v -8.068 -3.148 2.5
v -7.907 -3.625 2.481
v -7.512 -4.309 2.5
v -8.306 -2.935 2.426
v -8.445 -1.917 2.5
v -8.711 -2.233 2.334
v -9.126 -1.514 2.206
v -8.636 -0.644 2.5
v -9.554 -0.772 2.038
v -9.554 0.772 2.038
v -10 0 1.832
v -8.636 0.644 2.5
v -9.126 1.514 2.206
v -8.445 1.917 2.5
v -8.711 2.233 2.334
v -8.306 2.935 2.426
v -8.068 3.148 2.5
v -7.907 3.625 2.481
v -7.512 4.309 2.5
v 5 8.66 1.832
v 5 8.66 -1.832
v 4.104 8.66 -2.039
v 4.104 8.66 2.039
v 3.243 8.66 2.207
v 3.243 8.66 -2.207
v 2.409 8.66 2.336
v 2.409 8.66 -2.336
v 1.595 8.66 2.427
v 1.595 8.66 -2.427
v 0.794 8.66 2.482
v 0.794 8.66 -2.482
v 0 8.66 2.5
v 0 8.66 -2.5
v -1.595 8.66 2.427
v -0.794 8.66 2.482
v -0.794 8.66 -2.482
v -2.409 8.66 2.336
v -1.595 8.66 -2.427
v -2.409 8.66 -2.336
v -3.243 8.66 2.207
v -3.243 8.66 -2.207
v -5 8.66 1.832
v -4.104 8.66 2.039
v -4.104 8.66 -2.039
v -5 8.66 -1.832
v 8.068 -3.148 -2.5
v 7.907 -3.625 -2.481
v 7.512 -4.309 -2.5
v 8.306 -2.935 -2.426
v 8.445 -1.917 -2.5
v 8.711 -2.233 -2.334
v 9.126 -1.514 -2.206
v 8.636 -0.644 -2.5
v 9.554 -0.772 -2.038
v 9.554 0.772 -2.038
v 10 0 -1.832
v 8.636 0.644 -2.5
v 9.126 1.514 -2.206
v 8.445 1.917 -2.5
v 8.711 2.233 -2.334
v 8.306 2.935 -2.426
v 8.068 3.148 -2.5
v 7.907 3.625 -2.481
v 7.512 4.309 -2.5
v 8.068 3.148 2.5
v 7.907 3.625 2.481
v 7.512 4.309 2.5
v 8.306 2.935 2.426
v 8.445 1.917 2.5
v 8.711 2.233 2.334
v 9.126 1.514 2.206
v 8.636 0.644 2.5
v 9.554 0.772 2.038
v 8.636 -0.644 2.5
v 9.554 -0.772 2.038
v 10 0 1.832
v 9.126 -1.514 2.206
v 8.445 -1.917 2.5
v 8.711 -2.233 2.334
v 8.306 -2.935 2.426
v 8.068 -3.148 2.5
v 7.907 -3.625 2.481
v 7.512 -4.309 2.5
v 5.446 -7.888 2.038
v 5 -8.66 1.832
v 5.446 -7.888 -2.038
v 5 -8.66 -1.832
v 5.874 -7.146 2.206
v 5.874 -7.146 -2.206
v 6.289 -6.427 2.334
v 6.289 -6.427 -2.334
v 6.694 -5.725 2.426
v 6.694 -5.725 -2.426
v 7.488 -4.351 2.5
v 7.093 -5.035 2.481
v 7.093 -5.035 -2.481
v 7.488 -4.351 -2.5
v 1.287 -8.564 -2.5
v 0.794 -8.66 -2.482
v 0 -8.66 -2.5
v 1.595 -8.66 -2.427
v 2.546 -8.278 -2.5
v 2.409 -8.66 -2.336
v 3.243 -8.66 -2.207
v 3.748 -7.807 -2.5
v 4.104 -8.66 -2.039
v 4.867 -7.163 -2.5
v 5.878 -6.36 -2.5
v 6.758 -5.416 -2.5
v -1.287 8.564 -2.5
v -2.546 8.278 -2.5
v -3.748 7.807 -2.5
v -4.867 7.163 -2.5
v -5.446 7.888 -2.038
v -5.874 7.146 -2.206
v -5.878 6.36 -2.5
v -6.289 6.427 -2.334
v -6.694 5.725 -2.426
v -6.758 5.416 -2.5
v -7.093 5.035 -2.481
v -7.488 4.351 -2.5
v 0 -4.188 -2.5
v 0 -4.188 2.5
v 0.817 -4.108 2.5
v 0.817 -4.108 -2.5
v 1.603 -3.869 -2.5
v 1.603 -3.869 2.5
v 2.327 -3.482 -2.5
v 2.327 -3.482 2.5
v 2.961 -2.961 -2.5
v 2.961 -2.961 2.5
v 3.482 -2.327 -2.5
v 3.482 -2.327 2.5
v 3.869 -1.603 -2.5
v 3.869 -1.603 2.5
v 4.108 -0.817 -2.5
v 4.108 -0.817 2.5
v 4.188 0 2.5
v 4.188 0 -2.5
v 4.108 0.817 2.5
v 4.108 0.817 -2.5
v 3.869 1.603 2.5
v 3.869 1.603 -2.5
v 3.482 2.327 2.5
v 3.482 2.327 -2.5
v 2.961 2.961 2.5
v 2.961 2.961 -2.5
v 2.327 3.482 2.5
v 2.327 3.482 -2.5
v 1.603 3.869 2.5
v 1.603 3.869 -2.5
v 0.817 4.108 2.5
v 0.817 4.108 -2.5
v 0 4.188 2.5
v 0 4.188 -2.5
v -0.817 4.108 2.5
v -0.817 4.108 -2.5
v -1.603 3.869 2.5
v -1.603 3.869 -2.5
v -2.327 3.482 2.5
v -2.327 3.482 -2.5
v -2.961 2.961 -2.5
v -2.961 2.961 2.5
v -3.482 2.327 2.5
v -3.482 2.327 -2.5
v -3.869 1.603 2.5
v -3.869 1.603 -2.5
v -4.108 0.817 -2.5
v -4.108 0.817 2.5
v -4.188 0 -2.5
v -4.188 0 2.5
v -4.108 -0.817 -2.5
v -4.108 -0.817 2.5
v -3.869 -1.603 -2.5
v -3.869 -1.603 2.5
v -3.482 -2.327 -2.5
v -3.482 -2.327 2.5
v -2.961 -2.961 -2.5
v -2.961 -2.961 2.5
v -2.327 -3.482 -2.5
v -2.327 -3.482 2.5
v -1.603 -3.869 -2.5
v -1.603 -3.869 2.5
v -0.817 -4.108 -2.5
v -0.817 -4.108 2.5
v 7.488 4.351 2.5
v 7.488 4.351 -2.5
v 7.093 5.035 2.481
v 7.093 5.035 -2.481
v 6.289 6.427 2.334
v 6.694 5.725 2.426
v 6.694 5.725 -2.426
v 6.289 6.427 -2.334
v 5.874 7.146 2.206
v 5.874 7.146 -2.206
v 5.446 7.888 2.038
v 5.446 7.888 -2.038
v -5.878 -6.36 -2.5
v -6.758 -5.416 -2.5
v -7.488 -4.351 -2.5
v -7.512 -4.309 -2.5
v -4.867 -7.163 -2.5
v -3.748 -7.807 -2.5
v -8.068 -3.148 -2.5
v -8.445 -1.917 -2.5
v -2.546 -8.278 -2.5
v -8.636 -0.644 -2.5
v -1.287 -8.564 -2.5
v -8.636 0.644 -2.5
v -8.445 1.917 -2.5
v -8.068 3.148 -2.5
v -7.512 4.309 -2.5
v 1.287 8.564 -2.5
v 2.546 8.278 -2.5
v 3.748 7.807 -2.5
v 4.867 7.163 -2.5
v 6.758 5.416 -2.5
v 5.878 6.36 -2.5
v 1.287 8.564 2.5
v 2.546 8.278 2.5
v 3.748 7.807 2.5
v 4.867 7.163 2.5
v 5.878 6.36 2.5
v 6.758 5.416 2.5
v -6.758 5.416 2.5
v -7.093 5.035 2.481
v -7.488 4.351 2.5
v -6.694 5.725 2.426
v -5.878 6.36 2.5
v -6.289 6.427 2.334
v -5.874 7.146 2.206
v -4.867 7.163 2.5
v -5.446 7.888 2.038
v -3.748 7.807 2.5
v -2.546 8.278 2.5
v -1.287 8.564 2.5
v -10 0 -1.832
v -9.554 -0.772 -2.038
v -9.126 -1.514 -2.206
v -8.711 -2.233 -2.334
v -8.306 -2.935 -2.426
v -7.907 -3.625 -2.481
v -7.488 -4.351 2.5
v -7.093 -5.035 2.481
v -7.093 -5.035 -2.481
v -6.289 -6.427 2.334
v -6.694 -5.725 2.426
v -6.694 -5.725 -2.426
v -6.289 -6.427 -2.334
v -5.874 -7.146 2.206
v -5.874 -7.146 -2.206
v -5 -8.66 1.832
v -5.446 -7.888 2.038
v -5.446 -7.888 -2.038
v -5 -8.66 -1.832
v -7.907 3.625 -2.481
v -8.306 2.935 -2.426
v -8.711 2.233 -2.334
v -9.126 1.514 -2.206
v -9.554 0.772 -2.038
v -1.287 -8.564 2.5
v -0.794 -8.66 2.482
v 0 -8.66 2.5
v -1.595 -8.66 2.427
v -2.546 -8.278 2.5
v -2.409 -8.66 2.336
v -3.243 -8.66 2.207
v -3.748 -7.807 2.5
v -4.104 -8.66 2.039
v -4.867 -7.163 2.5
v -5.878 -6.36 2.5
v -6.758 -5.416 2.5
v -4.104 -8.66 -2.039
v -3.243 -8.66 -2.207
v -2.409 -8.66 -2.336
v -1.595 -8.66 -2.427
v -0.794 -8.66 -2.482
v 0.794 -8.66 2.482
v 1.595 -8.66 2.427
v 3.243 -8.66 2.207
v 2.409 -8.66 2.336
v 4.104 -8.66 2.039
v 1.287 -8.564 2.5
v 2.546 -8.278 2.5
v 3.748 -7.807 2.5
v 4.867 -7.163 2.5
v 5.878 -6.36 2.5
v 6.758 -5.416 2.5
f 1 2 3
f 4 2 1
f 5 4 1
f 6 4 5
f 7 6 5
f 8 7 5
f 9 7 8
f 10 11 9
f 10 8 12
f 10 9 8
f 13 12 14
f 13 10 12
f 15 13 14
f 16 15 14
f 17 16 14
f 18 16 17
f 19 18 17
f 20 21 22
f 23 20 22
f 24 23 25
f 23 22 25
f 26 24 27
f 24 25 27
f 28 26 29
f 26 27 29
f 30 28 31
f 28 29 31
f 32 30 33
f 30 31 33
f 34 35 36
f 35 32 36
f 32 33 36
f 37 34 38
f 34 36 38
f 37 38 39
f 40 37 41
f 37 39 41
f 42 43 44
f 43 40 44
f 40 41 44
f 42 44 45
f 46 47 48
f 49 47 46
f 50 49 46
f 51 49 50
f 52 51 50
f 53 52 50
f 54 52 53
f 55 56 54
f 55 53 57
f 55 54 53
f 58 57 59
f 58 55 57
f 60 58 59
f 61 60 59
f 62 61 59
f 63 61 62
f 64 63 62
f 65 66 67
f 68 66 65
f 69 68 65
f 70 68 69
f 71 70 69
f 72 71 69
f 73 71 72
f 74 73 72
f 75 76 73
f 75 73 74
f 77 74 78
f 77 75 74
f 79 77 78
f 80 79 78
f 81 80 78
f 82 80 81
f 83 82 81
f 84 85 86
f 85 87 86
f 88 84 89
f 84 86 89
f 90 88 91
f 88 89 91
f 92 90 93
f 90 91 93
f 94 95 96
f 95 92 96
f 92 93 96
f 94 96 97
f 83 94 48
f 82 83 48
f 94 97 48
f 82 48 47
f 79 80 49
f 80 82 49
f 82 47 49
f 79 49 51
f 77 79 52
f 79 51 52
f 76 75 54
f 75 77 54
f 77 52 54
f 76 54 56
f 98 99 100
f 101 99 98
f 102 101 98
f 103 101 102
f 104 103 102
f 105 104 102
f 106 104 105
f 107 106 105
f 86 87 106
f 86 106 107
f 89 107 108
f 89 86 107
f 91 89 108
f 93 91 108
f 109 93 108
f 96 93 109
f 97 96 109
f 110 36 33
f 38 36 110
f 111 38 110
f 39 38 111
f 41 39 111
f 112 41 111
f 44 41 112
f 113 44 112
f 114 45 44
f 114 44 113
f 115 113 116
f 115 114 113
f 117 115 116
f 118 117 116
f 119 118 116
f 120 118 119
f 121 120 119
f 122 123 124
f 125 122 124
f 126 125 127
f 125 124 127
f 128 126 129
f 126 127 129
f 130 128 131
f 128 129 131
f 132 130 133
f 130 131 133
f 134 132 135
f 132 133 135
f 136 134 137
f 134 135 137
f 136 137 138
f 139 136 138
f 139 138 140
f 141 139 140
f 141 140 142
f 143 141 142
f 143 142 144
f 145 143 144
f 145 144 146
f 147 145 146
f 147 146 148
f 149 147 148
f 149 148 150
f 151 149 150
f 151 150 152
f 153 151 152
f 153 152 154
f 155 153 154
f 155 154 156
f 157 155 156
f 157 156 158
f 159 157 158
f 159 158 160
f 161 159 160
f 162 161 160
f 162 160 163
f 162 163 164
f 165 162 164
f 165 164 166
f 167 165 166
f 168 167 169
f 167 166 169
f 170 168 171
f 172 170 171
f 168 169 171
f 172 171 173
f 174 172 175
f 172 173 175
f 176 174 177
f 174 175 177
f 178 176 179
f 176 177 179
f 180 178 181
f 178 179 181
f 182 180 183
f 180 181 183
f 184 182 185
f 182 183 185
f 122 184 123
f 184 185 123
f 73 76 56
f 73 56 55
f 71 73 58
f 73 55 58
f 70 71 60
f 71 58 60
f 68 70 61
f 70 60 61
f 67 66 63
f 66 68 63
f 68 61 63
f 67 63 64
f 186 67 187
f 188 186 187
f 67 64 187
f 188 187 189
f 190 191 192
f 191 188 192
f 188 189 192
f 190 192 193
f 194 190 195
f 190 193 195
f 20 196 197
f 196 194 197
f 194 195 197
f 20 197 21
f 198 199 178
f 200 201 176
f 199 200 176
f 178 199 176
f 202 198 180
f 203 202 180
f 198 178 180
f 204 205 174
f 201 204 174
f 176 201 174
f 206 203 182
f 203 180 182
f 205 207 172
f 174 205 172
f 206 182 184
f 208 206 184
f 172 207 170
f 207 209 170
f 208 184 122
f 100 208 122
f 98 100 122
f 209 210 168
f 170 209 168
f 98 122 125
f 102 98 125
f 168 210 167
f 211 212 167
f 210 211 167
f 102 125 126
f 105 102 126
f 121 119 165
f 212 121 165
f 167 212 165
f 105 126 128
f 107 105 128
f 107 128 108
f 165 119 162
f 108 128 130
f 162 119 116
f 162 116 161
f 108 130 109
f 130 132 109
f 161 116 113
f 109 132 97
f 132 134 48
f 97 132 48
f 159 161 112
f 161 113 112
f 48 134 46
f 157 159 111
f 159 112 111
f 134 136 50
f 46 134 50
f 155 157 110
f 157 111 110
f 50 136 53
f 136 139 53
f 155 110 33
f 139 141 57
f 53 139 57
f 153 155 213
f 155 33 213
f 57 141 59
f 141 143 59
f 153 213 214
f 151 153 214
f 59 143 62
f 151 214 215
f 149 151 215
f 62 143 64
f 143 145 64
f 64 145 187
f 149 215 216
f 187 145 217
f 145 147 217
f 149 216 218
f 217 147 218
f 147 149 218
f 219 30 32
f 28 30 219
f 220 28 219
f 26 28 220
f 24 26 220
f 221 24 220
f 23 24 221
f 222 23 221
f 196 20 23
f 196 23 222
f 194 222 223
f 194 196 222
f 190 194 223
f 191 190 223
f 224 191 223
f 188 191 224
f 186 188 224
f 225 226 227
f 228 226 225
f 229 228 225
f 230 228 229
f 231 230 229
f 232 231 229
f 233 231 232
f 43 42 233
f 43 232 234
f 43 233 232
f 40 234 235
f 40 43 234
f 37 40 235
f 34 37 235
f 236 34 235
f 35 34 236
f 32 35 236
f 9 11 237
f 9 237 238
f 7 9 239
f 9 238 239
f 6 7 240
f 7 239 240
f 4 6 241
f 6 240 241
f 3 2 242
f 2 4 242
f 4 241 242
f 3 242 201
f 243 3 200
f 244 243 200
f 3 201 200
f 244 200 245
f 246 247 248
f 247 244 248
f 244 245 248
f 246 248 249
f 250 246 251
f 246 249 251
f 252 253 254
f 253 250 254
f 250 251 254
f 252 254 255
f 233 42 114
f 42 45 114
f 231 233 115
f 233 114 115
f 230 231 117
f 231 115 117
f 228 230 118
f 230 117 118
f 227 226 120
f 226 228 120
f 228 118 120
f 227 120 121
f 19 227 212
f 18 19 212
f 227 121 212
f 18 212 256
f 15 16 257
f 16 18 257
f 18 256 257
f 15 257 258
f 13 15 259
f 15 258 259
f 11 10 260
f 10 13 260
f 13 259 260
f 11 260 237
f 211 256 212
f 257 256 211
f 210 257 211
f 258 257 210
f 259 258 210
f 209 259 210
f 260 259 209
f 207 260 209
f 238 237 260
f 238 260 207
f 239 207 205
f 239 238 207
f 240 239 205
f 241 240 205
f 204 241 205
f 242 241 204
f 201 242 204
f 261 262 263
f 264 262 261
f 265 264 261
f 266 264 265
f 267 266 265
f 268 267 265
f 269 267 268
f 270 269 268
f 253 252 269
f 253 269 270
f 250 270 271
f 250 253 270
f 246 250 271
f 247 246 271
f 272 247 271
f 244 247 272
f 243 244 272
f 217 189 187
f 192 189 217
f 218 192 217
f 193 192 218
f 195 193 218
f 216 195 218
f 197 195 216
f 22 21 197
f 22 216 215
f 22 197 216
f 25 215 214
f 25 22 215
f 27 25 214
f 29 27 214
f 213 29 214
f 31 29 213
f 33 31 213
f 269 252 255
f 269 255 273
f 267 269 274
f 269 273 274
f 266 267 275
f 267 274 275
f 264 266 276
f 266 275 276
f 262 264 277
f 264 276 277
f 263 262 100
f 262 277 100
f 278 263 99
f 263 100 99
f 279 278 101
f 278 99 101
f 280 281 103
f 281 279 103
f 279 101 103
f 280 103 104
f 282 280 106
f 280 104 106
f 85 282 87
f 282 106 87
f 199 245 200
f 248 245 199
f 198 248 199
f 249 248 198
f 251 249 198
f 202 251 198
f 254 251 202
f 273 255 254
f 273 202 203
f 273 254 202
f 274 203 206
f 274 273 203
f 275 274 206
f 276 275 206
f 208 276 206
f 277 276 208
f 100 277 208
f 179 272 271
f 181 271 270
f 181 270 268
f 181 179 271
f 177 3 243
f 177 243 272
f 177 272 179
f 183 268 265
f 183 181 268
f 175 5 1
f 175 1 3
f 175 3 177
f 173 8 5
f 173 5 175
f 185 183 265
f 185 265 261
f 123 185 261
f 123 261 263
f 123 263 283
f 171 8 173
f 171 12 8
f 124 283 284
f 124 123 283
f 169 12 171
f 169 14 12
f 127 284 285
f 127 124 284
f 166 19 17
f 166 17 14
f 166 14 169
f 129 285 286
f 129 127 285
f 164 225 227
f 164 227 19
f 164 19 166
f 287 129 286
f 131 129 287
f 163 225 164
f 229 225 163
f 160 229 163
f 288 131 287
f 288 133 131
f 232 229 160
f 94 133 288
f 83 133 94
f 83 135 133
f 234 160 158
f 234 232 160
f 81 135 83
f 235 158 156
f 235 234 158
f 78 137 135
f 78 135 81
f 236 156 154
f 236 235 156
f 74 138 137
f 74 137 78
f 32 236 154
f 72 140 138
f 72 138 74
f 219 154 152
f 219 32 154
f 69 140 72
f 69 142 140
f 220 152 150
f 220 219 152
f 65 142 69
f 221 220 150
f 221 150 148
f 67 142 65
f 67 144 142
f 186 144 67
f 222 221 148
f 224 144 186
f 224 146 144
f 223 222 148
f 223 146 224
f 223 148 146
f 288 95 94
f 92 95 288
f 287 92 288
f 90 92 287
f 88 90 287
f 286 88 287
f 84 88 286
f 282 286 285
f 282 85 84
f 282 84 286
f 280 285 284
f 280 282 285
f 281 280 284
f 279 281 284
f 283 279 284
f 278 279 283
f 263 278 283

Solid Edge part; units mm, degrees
sketch "Sketch1" plane through (0, 0, 0) normal (0, 0, 1) x (1, 0, 0)
  line L0 (-5, -8.6603) -> (5, -8.6603)
  line L1 (5, -8.6603) -> (10, 0)
  line L2 (10, 0) -> (5, 8.6603)
  line L3 (5, 8.6603) -> (-5, 8.6603)
  line L4 (-5, 8.6603) -> (-10, 0)
  line L5 (-10, 0) -> (-5, -8.6603)
extrude "Protrusion1" add sketch "Sketch1" along normal mid plane 5
hole "Hole_1" at (0, 0, 2.5) direction (0, 0, -1) diameter 8.376 end through all
sketch "Sketch2" plane through (0, 0, 0) normal (1, 0, 0) x (0, 1, 0)
  line L0 (8.6603, -2.5) -> (27.7764, 7.0367)
revolve "RevolvedCutout1" cut sketch "Sketch2" angle 360 about axis through (0, 0, -57) along (0, 0, 1) material side at (0, 18.2407, 2.2236)
mirror "Mirror1" about plane through (0, 0, 0) normal (0, 0, 1) of "RevolvedCutout1"
properties part number "7" material "Fe 410 W"
